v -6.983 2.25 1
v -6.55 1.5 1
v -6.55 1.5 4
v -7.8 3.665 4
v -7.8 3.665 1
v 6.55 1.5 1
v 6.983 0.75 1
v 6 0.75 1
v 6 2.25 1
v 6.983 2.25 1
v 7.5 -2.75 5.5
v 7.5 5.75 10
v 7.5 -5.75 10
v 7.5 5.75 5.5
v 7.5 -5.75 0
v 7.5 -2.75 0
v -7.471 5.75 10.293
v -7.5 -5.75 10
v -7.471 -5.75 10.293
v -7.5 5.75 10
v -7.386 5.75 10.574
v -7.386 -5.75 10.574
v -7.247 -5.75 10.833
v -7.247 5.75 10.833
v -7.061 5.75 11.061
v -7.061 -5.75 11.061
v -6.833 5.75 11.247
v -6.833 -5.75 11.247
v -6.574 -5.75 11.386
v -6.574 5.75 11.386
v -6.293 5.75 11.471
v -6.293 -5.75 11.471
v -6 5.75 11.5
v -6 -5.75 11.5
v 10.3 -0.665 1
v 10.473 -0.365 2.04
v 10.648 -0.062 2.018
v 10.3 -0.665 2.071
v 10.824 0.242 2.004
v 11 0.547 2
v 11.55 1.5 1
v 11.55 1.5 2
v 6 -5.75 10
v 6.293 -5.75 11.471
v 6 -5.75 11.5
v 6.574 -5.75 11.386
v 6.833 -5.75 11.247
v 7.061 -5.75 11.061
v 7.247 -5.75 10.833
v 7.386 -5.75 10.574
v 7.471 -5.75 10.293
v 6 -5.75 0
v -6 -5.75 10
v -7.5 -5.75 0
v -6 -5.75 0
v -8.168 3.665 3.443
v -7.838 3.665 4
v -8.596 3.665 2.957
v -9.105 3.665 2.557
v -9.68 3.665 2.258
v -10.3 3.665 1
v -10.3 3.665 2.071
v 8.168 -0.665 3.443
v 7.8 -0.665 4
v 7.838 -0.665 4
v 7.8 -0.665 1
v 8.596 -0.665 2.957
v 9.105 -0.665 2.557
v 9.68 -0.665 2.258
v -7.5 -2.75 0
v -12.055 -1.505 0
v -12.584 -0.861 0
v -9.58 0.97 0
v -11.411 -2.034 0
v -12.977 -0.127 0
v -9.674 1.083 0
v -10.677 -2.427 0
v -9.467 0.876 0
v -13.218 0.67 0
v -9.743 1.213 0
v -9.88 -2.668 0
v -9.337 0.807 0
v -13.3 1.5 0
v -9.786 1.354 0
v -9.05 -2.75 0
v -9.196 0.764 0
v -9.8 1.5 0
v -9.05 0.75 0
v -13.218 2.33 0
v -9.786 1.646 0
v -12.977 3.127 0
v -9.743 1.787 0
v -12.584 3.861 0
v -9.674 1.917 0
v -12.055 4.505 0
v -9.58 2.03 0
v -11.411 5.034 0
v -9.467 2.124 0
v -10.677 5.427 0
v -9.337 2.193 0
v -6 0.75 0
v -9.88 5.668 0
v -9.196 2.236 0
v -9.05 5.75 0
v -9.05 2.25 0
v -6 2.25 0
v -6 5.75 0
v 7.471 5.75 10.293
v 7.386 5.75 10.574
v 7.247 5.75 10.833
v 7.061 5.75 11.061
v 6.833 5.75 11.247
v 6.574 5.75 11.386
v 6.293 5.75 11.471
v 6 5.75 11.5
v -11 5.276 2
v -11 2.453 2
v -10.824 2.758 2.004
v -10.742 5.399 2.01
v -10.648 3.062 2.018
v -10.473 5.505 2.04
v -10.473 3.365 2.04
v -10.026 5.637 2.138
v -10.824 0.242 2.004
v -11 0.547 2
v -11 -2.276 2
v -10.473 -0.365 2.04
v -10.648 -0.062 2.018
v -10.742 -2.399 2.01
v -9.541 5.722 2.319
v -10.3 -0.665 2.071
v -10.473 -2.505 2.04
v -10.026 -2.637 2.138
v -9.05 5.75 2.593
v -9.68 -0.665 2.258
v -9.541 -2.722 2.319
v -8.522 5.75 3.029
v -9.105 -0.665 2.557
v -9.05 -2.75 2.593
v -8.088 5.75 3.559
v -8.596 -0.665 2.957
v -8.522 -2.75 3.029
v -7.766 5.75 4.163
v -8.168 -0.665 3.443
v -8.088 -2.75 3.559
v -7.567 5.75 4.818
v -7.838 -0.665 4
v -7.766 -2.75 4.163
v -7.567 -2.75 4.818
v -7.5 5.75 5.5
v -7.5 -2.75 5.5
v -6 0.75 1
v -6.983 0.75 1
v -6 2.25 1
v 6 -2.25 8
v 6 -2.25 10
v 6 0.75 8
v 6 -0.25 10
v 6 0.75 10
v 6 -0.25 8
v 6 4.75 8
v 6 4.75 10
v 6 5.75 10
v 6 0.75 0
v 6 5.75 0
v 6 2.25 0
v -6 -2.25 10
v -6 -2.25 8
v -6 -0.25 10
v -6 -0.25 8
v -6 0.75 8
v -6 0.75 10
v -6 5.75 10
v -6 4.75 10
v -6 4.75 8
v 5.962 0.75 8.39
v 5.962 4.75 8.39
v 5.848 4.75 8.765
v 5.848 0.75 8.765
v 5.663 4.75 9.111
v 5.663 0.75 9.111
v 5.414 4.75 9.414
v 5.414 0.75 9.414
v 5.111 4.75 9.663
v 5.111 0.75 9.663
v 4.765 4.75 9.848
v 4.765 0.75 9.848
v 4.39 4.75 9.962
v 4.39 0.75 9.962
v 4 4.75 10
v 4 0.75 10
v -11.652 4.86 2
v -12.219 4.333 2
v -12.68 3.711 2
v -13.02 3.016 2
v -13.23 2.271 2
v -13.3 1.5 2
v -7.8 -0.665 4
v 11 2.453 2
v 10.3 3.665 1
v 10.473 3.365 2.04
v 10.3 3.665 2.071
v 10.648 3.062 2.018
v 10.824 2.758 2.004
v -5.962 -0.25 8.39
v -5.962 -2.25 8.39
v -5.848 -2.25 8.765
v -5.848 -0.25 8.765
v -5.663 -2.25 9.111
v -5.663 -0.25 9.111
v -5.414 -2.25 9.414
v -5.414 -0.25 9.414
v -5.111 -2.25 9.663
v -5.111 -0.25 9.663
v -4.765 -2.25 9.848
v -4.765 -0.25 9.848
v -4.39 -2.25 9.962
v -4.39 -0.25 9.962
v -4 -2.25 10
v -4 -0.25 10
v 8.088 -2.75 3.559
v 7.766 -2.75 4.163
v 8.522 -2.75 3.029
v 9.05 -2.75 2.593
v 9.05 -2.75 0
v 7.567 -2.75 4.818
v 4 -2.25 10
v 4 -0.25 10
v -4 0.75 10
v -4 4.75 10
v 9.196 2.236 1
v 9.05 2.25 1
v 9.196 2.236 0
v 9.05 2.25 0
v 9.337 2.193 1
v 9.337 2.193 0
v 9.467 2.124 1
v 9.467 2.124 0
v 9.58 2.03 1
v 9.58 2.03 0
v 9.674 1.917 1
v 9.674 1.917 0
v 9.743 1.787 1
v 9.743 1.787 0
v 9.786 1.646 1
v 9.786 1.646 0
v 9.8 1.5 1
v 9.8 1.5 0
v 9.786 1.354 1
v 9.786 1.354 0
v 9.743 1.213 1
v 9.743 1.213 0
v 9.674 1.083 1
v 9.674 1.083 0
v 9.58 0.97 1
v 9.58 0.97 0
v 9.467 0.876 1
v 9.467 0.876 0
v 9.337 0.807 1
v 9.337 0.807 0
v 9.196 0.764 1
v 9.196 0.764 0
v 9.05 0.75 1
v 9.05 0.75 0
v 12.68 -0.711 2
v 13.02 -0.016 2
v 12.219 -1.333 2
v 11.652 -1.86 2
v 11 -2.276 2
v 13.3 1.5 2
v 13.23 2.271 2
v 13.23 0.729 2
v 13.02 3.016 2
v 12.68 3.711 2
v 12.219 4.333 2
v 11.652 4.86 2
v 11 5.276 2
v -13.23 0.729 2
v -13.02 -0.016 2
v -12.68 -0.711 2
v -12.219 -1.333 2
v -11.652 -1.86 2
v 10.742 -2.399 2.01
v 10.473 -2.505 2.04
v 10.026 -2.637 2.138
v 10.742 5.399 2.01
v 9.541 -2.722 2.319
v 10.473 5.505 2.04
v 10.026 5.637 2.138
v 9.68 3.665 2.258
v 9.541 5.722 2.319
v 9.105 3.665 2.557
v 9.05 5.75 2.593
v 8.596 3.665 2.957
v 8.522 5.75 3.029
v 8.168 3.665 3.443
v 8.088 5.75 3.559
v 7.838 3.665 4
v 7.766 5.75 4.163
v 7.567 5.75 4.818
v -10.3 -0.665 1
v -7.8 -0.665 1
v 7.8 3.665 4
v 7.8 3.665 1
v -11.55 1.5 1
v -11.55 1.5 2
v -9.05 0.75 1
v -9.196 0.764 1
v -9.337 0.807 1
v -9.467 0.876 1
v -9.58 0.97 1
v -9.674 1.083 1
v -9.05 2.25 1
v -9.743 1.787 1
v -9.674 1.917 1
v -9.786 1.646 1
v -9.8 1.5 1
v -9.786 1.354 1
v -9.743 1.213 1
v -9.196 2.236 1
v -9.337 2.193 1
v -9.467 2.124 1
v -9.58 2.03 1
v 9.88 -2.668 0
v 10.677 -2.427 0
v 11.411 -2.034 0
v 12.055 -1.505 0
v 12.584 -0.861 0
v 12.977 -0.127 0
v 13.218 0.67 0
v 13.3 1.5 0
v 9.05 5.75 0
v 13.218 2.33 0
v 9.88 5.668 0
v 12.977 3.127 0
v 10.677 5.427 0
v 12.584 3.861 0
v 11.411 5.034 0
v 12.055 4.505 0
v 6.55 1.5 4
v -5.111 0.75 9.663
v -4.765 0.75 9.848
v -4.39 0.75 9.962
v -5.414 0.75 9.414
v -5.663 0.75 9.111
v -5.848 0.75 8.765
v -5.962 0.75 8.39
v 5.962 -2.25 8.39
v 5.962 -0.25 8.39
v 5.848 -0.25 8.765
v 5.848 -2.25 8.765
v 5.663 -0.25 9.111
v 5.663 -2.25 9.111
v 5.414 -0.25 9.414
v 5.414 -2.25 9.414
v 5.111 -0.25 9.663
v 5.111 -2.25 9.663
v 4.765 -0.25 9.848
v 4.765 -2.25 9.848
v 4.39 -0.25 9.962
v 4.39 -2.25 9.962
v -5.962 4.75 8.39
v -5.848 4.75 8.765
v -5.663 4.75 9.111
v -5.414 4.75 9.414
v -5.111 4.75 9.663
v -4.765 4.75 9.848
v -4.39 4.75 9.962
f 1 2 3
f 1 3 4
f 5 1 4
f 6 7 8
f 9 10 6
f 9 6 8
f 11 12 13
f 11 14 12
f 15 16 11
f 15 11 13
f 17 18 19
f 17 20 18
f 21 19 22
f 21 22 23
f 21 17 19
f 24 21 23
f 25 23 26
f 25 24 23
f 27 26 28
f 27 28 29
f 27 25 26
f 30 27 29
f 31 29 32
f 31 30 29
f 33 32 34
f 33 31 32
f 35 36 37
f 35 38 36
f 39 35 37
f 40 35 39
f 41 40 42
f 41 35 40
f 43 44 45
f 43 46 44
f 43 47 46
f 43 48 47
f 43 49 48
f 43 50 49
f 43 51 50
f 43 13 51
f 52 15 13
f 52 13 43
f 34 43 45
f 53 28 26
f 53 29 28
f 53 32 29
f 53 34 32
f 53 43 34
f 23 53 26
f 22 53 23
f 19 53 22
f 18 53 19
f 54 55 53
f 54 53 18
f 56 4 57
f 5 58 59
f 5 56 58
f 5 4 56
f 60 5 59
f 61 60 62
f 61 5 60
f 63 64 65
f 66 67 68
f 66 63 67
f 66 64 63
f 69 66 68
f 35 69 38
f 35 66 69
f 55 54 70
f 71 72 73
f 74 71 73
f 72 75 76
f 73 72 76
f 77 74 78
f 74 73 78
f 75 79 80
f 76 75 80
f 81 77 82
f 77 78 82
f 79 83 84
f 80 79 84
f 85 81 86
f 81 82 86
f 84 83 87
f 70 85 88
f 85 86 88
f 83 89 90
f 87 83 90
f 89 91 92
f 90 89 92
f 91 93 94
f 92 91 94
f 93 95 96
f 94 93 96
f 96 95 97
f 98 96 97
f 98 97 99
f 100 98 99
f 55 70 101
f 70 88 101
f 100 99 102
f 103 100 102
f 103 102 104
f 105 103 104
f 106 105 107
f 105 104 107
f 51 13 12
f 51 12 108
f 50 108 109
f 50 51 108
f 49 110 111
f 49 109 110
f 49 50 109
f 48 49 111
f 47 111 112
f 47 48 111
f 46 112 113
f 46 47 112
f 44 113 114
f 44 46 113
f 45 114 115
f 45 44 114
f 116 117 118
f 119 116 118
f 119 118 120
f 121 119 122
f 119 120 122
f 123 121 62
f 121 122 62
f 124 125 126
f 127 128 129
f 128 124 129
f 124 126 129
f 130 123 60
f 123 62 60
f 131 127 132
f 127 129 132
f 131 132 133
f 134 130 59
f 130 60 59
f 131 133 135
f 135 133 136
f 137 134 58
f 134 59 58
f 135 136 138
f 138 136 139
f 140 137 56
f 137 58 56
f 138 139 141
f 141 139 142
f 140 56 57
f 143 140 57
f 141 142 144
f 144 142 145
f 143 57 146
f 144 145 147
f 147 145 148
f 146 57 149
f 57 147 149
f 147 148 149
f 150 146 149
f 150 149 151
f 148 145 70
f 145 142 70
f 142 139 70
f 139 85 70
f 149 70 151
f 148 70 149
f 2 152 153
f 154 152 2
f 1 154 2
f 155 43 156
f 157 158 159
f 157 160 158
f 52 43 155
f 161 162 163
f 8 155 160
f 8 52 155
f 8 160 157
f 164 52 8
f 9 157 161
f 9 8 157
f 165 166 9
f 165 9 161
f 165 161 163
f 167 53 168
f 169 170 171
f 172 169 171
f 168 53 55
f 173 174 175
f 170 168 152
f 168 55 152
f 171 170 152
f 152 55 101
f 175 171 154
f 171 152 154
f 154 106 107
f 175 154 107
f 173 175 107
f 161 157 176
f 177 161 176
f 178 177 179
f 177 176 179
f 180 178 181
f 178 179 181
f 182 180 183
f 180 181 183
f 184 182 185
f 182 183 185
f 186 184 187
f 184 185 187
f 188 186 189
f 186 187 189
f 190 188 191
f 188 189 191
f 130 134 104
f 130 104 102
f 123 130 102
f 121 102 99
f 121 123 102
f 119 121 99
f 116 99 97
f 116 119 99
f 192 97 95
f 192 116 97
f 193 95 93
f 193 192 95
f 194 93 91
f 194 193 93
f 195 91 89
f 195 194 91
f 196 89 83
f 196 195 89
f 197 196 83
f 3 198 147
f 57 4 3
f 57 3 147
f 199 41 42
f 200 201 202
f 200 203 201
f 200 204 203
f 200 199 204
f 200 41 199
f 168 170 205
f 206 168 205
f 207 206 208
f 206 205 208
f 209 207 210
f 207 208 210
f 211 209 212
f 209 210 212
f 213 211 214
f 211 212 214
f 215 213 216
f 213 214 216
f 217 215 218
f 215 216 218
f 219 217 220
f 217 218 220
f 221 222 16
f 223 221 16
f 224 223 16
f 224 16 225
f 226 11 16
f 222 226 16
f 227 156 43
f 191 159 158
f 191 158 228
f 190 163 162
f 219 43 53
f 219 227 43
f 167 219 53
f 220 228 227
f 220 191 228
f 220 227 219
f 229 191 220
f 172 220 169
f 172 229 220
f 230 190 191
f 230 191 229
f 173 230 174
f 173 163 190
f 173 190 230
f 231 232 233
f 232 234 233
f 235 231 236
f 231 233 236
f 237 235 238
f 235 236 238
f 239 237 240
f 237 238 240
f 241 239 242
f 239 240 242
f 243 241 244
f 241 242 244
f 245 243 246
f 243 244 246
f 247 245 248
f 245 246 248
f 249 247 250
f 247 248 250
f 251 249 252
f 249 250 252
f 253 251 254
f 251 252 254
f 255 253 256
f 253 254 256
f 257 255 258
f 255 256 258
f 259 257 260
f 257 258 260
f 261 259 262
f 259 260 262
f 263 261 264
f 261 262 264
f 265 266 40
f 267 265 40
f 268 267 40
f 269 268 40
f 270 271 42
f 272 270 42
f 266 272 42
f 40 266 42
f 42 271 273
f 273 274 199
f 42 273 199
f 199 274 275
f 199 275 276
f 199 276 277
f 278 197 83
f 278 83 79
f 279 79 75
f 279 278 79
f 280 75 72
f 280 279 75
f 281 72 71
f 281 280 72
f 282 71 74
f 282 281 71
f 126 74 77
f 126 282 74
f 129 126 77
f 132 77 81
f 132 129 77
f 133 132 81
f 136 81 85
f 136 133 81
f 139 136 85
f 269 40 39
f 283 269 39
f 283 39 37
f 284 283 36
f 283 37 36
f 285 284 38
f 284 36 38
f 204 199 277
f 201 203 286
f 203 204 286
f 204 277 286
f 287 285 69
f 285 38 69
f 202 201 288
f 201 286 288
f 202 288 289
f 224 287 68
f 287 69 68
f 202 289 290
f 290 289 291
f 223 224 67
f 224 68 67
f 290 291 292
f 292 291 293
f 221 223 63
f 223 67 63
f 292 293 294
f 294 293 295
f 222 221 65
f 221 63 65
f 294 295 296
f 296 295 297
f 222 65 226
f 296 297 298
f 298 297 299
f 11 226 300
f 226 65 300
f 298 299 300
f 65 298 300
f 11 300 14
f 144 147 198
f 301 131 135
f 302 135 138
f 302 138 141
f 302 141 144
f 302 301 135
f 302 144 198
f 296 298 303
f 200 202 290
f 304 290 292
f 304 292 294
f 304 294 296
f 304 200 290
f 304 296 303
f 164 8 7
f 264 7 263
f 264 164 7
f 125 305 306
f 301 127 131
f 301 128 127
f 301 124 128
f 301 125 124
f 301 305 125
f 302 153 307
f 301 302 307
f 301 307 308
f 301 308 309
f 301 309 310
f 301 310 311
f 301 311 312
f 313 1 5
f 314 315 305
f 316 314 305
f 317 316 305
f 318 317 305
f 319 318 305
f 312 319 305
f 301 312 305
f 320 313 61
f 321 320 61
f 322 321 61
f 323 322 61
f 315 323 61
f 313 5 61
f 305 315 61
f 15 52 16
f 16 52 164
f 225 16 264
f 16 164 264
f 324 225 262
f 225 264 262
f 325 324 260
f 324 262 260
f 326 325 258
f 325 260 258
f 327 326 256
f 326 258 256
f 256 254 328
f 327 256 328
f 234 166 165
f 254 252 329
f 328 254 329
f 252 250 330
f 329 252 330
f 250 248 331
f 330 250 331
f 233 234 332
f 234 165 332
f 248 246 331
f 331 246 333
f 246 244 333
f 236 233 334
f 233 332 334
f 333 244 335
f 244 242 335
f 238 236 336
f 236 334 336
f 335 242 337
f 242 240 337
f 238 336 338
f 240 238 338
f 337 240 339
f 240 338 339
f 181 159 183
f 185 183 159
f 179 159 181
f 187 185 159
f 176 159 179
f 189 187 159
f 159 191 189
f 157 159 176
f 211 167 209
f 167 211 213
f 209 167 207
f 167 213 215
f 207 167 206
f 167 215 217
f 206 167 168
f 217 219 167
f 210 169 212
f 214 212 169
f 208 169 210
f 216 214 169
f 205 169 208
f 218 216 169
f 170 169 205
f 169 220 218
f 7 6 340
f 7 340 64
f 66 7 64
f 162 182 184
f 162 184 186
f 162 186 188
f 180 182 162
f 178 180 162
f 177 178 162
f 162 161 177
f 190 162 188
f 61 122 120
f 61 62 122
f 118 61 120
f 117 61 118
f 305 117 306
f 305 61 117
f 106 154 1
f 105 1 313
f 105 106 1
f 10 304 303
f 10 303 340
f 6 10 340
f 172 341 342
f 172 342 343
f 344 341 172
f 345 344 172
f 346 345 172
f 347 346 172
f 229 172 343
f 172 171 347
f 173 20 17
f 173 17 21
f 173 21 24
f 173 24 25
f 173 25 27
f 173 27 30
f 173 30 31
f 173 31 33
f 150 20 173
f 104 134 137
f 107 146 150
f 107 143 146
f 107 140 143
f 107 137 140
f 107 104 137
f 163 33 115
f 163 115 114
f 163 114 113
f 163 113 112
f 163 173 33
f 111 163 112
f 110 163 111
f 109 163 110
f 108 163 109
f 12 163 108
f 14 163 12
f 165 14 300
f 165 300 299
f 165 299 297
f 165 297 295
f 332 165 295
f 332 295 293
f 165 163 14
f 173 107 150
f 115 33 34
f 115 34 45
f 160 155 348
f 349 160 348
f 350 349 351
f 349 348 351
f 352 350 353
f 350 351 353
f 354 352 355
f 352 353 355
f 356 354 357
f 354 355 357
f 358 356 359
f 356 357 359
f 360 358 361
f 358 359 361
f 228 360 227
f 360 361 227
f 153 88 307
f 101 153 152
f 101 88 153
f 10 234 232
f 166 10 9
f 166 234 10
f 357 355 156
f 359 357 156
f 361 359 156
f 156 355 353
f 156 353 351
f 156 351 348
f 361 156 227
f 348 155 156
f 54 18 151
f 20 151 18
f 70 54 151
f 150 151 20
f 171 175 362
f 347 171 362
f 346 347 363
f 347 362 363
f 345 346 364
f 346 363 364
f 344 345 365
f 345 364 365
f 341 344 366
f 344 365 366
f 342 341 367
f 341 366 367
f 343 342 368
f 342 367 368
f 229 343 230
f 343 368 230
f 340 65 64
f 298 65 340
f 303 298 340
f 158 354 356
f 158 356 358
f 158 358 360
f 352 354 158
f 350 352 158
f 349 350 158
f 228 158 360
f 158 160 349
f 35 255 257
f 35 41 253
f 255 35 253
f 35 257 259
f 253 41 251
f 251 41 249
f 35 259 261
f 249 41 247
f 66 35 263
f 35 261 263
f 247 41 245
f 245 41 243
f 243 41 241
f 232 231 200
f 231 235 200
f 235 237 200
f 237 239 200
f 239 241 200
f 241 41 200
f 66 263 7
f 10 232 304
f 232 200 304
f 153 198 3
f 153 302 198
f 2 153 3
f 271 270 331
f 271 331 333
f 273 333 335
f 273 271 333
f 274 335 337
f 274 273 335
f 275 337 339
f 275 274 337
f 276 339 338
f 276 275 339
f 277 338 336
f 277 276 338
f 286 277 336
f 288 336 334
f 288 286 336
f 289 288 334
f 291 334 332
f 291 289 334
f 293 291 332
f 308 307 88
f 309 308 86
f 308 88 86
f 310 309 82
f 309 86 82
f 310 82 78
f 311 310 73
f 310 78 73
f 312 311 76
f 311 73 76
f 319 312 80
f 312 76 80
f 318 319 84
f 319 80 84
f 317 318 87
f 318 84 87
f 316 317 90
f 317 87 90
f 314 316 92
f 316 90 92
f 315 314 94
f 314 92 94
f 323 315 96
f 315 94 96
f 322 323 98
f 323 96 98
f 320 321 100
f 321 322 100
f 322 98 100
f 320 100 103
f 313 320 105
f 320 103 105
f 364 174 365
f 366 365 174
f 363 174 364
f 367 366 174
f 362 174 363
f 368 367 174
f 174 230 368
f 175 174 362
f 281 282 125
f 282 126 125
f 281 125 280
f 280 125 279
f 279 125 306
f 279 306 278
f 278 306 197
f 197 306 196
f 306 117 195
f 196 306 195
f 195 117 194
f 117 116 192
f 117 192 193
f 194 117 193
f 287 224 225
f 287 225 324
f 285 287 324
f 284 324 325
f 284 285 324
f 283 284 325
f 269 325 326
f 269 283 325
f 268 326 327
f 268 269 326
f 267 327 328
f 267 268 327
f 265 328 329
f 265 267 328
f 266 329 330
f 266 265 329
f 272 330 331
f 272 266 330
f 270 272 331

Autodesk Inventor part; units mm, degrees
ref_plane "YZ Plane" through (0, 0, 0) normal (1, 0, 0) x (0, 1, 0)
ref_plane "XZ Plane" through (0, 0, 0) normal (0, 1, 0) x (-1, 0, 0)
sketch "Szkic1" plane through (0, 0, 0) normal (0, 0, 1) x (1, 0, 0)
  line L0 (-7.5, 5.75) -> (7.5, 5.75)
  line L1 (7.5, 5.75) -> (7.5, -5.75)
  line L2 (7.5, -5.75) -> (-7.5, -5.75)
  line L3 (-7.5, -5.75) -> (-7.5, 5.75)
  point P0 (0, 0)
  point P1 (0, 5.75)
  point P2 (-7.5, 0)
  dimension "d0" = 15
  dimension "d1" = 11.5
extrude "Wyciągnięcie proste1" add sketch "Szkic1" along normal blind 11.5
sketch "Szkic2" plane through (0, 0, 0) normal (0, 0, -1) x (-1, 0, 0)
  line L0 (7.5, 5.75) -> (-7.5, 5.75) projected
  line L1 (-7.5, 5.75) -> (-7.5, -5.75) projected
  line L2 (7.5, -5.75) -> (7.5, 5.75) projected
  line L3 (-13.3, 5.75) -> (13.3, 5.75)
  line L4 (13.3, 5.75) -> (13.3, -2.75)
  line L5 (13.3, -2.75) -> (-13.3, -2.75)
  line L6 (-13.3, -2.75) -> (-13.3, 5.75)
  point P0 (0, 0)
  dimension "d4" = 8.5
  dimension "d5" = 5.8
  dimension "d6" = 5.8
extrude "Wyciągnięcie proste2" add sketch "Szkic2" against normal blind 2
fillet "Zaokrąglenie1" radius 4.25 4 edges at (-13.3, -2.75, 1) (-13.3, 5.75, 1) (13.3, -2.75, 1) (13.3, 5.75, 1)
fillet "Zaokrąglenie2" radius 1.5 2 edges at (-7.5, 0, 11.5) (7.5, 0, 11.5)
fillet "Zaokrąglenie3" radius 3.5 2 edges at (-7.5, 1.5, 2) (7.5, 1.5, 2)
ref_plane "Płaszczyzna konstrukcyjna1" through (0, 0, 1) normal (0, 0, -1) x (-1, 0, 0)
sketch "Szkic3" plane through (0, 0, 1) normal (0, 0, -1) x (-1, 0, 0)
  arc A0 (-9.05, 5.75) -> (-9.05, -2.75) centre (-9.05, 1.5) ccw projected
  arc A1 (9.05, -2.75) -> (9.05, 5.75) centre (9.05, 1.5) ccw projected
  line L0 (-6.55, 1.5) -> (-7.8, -0.6651)
  line L1 (-7.8, -0.6651) -> (-10.3, -0.6651)
  line L2 (-10.3, -0.6651) -> (-11.55, 1.5)
  line L3 (-11.55, 1.5) -> (-10.3, 3.6651)
  line L4 (-10.3, 3.6651) -> (-7.8, 3.6651)
  line L5 (-7.8, 3.6651) -> (-6.55, 1.5)
  line L6 (6.55, 1.5) -> (7.8, 3.6651)
  line L7 (7.8, 3.6651) -> (10.3, 3.6651)
  line L8 (10.3, 3.6651) -> (11.55, 1.5)
  line L9 (11.55, 1.5) -> (10.3, -0.6651)
  line L10 (10.3, -0.6651) -> (7.8, -0.6651)
  line L11 (7.8, -0.6651) -> (6.55, 1.5)
  point P0 (0, 0)
  dimension "d13" = 2.5
  dimension "d14" = 18.1
extrude "Wyciągnięcie proste3" cut sketch "Szkic3" against normal blind 3
sketch "Szkic4" plane through (0, 0, 0) normal (0, 0, -1) x (-1, 0, 0)
  arc A0 (-9.05, 5.75) -> (-9.05, -2.75) centre (-9.05, 1.5) ccw projected
  arc A1 (9.05, -2.75) -> (9.05, 5.75) centre (9.05, 1.5) ccw projected
  circle A2 centre (-9.05, 1.5) radius 0.75
  circle A3 centre (9.05, 1.5) radius 0.75
  line L0 (-9.05, 2.25) -> (9.05, 2.25)
  line L1 (9.05, 0.75) -> (-9.05, 0.75)
  point P0 (0, 0)
  dimension "d17" = 1.5
extrude "Wyciągnięcie proste4" cut sketch "Szkic4" against normal blind 1
sketch "Szkic5" plane through (0, 0, 0) normal (0, 0, -1) x (-1, 0, 0)
  line L0 (-7.5, -5.75) -> (7.5, -5.75) projected
  line L1 (9.05, 5.75) -> (-9.05, 5.75) projected
  line L2 (-6, -5.75) -> (6, -5.75)
  line L3 (6, -5.75) -> (6, 5.75)
  line L4 (6, 5.75) -> (-6, 5.75)
  line L5 (-6, 5.75) -> (-6, -5.75)
  point P0 (0, 0)
  point P1 (0, 5.75)
  dimension "d20" = 12
extrude "Wyciągnięcie proste5" cut sketch "Szkic5" against normal blind 10
fillet "Zaokrąglenie4" radius 2 2 edges at (6, 0, 10) (-6, 0, 10)
sketch "Szkic7" plane through (0, 0, 0) normal (0, 0, -1) x (-1, 0, 0)
  line L0 (6, 5.75) -> (6, 2.25) projected
  line L1 (6, 0.75) -> (6, -5.75) projected
  line L2 (-6, 0.75) -> (-6, 2.25) projected
  line L3 (-6, 2.25) -> (-6, 5.75) projected
  line L4 (-6, -5.75) -> (-6, 0.75) projected
  line L5 (6, 2.25) -> (6, 0.75) projected
  line L6 (-6, 5.75) -> (6, 5.75)
  line L7 (6, 5.75) -> (6, 4.75)
  line L8 (6, 4.75) -> (-6, 4.75)
  line L9 (-6, 4.75) -> (-6, 5.75)
  line L10 (-6, 0.75) -> (6, 0.75)
  line L11 (6, 0.75) -> (6, -0.25)
  line L12 (6, -0.25) -> (-6, -0.25)
  line L13 (-6, -0.25) -> (-6, 0.75)
  line L14 (-6, -5.75) -> (6, -5.75)
  line L15 (6, -5.75) -> (6, -2.25)
  line L16 (6, -2.25) -> (-6, -2.25)
  line L17 (-6, -2.25) -> (-6, -5.75)
  point P0 (0, 0)
  dimension "d29" = 1
  dimension "d30" = 1
  dimension "d31" = 4
  dimension "d32" = 2
extrude "Wyciągnięcie proste7" cut sketch "Szkic7" against normal blind 10 contours L0 L8 L3 L6 | L1 L12 L4 L10 | L1 L14 L4 L16
equation "\"d6\" = d5"
properties part number "Mounting_bracket" material "ABS Plastic"
